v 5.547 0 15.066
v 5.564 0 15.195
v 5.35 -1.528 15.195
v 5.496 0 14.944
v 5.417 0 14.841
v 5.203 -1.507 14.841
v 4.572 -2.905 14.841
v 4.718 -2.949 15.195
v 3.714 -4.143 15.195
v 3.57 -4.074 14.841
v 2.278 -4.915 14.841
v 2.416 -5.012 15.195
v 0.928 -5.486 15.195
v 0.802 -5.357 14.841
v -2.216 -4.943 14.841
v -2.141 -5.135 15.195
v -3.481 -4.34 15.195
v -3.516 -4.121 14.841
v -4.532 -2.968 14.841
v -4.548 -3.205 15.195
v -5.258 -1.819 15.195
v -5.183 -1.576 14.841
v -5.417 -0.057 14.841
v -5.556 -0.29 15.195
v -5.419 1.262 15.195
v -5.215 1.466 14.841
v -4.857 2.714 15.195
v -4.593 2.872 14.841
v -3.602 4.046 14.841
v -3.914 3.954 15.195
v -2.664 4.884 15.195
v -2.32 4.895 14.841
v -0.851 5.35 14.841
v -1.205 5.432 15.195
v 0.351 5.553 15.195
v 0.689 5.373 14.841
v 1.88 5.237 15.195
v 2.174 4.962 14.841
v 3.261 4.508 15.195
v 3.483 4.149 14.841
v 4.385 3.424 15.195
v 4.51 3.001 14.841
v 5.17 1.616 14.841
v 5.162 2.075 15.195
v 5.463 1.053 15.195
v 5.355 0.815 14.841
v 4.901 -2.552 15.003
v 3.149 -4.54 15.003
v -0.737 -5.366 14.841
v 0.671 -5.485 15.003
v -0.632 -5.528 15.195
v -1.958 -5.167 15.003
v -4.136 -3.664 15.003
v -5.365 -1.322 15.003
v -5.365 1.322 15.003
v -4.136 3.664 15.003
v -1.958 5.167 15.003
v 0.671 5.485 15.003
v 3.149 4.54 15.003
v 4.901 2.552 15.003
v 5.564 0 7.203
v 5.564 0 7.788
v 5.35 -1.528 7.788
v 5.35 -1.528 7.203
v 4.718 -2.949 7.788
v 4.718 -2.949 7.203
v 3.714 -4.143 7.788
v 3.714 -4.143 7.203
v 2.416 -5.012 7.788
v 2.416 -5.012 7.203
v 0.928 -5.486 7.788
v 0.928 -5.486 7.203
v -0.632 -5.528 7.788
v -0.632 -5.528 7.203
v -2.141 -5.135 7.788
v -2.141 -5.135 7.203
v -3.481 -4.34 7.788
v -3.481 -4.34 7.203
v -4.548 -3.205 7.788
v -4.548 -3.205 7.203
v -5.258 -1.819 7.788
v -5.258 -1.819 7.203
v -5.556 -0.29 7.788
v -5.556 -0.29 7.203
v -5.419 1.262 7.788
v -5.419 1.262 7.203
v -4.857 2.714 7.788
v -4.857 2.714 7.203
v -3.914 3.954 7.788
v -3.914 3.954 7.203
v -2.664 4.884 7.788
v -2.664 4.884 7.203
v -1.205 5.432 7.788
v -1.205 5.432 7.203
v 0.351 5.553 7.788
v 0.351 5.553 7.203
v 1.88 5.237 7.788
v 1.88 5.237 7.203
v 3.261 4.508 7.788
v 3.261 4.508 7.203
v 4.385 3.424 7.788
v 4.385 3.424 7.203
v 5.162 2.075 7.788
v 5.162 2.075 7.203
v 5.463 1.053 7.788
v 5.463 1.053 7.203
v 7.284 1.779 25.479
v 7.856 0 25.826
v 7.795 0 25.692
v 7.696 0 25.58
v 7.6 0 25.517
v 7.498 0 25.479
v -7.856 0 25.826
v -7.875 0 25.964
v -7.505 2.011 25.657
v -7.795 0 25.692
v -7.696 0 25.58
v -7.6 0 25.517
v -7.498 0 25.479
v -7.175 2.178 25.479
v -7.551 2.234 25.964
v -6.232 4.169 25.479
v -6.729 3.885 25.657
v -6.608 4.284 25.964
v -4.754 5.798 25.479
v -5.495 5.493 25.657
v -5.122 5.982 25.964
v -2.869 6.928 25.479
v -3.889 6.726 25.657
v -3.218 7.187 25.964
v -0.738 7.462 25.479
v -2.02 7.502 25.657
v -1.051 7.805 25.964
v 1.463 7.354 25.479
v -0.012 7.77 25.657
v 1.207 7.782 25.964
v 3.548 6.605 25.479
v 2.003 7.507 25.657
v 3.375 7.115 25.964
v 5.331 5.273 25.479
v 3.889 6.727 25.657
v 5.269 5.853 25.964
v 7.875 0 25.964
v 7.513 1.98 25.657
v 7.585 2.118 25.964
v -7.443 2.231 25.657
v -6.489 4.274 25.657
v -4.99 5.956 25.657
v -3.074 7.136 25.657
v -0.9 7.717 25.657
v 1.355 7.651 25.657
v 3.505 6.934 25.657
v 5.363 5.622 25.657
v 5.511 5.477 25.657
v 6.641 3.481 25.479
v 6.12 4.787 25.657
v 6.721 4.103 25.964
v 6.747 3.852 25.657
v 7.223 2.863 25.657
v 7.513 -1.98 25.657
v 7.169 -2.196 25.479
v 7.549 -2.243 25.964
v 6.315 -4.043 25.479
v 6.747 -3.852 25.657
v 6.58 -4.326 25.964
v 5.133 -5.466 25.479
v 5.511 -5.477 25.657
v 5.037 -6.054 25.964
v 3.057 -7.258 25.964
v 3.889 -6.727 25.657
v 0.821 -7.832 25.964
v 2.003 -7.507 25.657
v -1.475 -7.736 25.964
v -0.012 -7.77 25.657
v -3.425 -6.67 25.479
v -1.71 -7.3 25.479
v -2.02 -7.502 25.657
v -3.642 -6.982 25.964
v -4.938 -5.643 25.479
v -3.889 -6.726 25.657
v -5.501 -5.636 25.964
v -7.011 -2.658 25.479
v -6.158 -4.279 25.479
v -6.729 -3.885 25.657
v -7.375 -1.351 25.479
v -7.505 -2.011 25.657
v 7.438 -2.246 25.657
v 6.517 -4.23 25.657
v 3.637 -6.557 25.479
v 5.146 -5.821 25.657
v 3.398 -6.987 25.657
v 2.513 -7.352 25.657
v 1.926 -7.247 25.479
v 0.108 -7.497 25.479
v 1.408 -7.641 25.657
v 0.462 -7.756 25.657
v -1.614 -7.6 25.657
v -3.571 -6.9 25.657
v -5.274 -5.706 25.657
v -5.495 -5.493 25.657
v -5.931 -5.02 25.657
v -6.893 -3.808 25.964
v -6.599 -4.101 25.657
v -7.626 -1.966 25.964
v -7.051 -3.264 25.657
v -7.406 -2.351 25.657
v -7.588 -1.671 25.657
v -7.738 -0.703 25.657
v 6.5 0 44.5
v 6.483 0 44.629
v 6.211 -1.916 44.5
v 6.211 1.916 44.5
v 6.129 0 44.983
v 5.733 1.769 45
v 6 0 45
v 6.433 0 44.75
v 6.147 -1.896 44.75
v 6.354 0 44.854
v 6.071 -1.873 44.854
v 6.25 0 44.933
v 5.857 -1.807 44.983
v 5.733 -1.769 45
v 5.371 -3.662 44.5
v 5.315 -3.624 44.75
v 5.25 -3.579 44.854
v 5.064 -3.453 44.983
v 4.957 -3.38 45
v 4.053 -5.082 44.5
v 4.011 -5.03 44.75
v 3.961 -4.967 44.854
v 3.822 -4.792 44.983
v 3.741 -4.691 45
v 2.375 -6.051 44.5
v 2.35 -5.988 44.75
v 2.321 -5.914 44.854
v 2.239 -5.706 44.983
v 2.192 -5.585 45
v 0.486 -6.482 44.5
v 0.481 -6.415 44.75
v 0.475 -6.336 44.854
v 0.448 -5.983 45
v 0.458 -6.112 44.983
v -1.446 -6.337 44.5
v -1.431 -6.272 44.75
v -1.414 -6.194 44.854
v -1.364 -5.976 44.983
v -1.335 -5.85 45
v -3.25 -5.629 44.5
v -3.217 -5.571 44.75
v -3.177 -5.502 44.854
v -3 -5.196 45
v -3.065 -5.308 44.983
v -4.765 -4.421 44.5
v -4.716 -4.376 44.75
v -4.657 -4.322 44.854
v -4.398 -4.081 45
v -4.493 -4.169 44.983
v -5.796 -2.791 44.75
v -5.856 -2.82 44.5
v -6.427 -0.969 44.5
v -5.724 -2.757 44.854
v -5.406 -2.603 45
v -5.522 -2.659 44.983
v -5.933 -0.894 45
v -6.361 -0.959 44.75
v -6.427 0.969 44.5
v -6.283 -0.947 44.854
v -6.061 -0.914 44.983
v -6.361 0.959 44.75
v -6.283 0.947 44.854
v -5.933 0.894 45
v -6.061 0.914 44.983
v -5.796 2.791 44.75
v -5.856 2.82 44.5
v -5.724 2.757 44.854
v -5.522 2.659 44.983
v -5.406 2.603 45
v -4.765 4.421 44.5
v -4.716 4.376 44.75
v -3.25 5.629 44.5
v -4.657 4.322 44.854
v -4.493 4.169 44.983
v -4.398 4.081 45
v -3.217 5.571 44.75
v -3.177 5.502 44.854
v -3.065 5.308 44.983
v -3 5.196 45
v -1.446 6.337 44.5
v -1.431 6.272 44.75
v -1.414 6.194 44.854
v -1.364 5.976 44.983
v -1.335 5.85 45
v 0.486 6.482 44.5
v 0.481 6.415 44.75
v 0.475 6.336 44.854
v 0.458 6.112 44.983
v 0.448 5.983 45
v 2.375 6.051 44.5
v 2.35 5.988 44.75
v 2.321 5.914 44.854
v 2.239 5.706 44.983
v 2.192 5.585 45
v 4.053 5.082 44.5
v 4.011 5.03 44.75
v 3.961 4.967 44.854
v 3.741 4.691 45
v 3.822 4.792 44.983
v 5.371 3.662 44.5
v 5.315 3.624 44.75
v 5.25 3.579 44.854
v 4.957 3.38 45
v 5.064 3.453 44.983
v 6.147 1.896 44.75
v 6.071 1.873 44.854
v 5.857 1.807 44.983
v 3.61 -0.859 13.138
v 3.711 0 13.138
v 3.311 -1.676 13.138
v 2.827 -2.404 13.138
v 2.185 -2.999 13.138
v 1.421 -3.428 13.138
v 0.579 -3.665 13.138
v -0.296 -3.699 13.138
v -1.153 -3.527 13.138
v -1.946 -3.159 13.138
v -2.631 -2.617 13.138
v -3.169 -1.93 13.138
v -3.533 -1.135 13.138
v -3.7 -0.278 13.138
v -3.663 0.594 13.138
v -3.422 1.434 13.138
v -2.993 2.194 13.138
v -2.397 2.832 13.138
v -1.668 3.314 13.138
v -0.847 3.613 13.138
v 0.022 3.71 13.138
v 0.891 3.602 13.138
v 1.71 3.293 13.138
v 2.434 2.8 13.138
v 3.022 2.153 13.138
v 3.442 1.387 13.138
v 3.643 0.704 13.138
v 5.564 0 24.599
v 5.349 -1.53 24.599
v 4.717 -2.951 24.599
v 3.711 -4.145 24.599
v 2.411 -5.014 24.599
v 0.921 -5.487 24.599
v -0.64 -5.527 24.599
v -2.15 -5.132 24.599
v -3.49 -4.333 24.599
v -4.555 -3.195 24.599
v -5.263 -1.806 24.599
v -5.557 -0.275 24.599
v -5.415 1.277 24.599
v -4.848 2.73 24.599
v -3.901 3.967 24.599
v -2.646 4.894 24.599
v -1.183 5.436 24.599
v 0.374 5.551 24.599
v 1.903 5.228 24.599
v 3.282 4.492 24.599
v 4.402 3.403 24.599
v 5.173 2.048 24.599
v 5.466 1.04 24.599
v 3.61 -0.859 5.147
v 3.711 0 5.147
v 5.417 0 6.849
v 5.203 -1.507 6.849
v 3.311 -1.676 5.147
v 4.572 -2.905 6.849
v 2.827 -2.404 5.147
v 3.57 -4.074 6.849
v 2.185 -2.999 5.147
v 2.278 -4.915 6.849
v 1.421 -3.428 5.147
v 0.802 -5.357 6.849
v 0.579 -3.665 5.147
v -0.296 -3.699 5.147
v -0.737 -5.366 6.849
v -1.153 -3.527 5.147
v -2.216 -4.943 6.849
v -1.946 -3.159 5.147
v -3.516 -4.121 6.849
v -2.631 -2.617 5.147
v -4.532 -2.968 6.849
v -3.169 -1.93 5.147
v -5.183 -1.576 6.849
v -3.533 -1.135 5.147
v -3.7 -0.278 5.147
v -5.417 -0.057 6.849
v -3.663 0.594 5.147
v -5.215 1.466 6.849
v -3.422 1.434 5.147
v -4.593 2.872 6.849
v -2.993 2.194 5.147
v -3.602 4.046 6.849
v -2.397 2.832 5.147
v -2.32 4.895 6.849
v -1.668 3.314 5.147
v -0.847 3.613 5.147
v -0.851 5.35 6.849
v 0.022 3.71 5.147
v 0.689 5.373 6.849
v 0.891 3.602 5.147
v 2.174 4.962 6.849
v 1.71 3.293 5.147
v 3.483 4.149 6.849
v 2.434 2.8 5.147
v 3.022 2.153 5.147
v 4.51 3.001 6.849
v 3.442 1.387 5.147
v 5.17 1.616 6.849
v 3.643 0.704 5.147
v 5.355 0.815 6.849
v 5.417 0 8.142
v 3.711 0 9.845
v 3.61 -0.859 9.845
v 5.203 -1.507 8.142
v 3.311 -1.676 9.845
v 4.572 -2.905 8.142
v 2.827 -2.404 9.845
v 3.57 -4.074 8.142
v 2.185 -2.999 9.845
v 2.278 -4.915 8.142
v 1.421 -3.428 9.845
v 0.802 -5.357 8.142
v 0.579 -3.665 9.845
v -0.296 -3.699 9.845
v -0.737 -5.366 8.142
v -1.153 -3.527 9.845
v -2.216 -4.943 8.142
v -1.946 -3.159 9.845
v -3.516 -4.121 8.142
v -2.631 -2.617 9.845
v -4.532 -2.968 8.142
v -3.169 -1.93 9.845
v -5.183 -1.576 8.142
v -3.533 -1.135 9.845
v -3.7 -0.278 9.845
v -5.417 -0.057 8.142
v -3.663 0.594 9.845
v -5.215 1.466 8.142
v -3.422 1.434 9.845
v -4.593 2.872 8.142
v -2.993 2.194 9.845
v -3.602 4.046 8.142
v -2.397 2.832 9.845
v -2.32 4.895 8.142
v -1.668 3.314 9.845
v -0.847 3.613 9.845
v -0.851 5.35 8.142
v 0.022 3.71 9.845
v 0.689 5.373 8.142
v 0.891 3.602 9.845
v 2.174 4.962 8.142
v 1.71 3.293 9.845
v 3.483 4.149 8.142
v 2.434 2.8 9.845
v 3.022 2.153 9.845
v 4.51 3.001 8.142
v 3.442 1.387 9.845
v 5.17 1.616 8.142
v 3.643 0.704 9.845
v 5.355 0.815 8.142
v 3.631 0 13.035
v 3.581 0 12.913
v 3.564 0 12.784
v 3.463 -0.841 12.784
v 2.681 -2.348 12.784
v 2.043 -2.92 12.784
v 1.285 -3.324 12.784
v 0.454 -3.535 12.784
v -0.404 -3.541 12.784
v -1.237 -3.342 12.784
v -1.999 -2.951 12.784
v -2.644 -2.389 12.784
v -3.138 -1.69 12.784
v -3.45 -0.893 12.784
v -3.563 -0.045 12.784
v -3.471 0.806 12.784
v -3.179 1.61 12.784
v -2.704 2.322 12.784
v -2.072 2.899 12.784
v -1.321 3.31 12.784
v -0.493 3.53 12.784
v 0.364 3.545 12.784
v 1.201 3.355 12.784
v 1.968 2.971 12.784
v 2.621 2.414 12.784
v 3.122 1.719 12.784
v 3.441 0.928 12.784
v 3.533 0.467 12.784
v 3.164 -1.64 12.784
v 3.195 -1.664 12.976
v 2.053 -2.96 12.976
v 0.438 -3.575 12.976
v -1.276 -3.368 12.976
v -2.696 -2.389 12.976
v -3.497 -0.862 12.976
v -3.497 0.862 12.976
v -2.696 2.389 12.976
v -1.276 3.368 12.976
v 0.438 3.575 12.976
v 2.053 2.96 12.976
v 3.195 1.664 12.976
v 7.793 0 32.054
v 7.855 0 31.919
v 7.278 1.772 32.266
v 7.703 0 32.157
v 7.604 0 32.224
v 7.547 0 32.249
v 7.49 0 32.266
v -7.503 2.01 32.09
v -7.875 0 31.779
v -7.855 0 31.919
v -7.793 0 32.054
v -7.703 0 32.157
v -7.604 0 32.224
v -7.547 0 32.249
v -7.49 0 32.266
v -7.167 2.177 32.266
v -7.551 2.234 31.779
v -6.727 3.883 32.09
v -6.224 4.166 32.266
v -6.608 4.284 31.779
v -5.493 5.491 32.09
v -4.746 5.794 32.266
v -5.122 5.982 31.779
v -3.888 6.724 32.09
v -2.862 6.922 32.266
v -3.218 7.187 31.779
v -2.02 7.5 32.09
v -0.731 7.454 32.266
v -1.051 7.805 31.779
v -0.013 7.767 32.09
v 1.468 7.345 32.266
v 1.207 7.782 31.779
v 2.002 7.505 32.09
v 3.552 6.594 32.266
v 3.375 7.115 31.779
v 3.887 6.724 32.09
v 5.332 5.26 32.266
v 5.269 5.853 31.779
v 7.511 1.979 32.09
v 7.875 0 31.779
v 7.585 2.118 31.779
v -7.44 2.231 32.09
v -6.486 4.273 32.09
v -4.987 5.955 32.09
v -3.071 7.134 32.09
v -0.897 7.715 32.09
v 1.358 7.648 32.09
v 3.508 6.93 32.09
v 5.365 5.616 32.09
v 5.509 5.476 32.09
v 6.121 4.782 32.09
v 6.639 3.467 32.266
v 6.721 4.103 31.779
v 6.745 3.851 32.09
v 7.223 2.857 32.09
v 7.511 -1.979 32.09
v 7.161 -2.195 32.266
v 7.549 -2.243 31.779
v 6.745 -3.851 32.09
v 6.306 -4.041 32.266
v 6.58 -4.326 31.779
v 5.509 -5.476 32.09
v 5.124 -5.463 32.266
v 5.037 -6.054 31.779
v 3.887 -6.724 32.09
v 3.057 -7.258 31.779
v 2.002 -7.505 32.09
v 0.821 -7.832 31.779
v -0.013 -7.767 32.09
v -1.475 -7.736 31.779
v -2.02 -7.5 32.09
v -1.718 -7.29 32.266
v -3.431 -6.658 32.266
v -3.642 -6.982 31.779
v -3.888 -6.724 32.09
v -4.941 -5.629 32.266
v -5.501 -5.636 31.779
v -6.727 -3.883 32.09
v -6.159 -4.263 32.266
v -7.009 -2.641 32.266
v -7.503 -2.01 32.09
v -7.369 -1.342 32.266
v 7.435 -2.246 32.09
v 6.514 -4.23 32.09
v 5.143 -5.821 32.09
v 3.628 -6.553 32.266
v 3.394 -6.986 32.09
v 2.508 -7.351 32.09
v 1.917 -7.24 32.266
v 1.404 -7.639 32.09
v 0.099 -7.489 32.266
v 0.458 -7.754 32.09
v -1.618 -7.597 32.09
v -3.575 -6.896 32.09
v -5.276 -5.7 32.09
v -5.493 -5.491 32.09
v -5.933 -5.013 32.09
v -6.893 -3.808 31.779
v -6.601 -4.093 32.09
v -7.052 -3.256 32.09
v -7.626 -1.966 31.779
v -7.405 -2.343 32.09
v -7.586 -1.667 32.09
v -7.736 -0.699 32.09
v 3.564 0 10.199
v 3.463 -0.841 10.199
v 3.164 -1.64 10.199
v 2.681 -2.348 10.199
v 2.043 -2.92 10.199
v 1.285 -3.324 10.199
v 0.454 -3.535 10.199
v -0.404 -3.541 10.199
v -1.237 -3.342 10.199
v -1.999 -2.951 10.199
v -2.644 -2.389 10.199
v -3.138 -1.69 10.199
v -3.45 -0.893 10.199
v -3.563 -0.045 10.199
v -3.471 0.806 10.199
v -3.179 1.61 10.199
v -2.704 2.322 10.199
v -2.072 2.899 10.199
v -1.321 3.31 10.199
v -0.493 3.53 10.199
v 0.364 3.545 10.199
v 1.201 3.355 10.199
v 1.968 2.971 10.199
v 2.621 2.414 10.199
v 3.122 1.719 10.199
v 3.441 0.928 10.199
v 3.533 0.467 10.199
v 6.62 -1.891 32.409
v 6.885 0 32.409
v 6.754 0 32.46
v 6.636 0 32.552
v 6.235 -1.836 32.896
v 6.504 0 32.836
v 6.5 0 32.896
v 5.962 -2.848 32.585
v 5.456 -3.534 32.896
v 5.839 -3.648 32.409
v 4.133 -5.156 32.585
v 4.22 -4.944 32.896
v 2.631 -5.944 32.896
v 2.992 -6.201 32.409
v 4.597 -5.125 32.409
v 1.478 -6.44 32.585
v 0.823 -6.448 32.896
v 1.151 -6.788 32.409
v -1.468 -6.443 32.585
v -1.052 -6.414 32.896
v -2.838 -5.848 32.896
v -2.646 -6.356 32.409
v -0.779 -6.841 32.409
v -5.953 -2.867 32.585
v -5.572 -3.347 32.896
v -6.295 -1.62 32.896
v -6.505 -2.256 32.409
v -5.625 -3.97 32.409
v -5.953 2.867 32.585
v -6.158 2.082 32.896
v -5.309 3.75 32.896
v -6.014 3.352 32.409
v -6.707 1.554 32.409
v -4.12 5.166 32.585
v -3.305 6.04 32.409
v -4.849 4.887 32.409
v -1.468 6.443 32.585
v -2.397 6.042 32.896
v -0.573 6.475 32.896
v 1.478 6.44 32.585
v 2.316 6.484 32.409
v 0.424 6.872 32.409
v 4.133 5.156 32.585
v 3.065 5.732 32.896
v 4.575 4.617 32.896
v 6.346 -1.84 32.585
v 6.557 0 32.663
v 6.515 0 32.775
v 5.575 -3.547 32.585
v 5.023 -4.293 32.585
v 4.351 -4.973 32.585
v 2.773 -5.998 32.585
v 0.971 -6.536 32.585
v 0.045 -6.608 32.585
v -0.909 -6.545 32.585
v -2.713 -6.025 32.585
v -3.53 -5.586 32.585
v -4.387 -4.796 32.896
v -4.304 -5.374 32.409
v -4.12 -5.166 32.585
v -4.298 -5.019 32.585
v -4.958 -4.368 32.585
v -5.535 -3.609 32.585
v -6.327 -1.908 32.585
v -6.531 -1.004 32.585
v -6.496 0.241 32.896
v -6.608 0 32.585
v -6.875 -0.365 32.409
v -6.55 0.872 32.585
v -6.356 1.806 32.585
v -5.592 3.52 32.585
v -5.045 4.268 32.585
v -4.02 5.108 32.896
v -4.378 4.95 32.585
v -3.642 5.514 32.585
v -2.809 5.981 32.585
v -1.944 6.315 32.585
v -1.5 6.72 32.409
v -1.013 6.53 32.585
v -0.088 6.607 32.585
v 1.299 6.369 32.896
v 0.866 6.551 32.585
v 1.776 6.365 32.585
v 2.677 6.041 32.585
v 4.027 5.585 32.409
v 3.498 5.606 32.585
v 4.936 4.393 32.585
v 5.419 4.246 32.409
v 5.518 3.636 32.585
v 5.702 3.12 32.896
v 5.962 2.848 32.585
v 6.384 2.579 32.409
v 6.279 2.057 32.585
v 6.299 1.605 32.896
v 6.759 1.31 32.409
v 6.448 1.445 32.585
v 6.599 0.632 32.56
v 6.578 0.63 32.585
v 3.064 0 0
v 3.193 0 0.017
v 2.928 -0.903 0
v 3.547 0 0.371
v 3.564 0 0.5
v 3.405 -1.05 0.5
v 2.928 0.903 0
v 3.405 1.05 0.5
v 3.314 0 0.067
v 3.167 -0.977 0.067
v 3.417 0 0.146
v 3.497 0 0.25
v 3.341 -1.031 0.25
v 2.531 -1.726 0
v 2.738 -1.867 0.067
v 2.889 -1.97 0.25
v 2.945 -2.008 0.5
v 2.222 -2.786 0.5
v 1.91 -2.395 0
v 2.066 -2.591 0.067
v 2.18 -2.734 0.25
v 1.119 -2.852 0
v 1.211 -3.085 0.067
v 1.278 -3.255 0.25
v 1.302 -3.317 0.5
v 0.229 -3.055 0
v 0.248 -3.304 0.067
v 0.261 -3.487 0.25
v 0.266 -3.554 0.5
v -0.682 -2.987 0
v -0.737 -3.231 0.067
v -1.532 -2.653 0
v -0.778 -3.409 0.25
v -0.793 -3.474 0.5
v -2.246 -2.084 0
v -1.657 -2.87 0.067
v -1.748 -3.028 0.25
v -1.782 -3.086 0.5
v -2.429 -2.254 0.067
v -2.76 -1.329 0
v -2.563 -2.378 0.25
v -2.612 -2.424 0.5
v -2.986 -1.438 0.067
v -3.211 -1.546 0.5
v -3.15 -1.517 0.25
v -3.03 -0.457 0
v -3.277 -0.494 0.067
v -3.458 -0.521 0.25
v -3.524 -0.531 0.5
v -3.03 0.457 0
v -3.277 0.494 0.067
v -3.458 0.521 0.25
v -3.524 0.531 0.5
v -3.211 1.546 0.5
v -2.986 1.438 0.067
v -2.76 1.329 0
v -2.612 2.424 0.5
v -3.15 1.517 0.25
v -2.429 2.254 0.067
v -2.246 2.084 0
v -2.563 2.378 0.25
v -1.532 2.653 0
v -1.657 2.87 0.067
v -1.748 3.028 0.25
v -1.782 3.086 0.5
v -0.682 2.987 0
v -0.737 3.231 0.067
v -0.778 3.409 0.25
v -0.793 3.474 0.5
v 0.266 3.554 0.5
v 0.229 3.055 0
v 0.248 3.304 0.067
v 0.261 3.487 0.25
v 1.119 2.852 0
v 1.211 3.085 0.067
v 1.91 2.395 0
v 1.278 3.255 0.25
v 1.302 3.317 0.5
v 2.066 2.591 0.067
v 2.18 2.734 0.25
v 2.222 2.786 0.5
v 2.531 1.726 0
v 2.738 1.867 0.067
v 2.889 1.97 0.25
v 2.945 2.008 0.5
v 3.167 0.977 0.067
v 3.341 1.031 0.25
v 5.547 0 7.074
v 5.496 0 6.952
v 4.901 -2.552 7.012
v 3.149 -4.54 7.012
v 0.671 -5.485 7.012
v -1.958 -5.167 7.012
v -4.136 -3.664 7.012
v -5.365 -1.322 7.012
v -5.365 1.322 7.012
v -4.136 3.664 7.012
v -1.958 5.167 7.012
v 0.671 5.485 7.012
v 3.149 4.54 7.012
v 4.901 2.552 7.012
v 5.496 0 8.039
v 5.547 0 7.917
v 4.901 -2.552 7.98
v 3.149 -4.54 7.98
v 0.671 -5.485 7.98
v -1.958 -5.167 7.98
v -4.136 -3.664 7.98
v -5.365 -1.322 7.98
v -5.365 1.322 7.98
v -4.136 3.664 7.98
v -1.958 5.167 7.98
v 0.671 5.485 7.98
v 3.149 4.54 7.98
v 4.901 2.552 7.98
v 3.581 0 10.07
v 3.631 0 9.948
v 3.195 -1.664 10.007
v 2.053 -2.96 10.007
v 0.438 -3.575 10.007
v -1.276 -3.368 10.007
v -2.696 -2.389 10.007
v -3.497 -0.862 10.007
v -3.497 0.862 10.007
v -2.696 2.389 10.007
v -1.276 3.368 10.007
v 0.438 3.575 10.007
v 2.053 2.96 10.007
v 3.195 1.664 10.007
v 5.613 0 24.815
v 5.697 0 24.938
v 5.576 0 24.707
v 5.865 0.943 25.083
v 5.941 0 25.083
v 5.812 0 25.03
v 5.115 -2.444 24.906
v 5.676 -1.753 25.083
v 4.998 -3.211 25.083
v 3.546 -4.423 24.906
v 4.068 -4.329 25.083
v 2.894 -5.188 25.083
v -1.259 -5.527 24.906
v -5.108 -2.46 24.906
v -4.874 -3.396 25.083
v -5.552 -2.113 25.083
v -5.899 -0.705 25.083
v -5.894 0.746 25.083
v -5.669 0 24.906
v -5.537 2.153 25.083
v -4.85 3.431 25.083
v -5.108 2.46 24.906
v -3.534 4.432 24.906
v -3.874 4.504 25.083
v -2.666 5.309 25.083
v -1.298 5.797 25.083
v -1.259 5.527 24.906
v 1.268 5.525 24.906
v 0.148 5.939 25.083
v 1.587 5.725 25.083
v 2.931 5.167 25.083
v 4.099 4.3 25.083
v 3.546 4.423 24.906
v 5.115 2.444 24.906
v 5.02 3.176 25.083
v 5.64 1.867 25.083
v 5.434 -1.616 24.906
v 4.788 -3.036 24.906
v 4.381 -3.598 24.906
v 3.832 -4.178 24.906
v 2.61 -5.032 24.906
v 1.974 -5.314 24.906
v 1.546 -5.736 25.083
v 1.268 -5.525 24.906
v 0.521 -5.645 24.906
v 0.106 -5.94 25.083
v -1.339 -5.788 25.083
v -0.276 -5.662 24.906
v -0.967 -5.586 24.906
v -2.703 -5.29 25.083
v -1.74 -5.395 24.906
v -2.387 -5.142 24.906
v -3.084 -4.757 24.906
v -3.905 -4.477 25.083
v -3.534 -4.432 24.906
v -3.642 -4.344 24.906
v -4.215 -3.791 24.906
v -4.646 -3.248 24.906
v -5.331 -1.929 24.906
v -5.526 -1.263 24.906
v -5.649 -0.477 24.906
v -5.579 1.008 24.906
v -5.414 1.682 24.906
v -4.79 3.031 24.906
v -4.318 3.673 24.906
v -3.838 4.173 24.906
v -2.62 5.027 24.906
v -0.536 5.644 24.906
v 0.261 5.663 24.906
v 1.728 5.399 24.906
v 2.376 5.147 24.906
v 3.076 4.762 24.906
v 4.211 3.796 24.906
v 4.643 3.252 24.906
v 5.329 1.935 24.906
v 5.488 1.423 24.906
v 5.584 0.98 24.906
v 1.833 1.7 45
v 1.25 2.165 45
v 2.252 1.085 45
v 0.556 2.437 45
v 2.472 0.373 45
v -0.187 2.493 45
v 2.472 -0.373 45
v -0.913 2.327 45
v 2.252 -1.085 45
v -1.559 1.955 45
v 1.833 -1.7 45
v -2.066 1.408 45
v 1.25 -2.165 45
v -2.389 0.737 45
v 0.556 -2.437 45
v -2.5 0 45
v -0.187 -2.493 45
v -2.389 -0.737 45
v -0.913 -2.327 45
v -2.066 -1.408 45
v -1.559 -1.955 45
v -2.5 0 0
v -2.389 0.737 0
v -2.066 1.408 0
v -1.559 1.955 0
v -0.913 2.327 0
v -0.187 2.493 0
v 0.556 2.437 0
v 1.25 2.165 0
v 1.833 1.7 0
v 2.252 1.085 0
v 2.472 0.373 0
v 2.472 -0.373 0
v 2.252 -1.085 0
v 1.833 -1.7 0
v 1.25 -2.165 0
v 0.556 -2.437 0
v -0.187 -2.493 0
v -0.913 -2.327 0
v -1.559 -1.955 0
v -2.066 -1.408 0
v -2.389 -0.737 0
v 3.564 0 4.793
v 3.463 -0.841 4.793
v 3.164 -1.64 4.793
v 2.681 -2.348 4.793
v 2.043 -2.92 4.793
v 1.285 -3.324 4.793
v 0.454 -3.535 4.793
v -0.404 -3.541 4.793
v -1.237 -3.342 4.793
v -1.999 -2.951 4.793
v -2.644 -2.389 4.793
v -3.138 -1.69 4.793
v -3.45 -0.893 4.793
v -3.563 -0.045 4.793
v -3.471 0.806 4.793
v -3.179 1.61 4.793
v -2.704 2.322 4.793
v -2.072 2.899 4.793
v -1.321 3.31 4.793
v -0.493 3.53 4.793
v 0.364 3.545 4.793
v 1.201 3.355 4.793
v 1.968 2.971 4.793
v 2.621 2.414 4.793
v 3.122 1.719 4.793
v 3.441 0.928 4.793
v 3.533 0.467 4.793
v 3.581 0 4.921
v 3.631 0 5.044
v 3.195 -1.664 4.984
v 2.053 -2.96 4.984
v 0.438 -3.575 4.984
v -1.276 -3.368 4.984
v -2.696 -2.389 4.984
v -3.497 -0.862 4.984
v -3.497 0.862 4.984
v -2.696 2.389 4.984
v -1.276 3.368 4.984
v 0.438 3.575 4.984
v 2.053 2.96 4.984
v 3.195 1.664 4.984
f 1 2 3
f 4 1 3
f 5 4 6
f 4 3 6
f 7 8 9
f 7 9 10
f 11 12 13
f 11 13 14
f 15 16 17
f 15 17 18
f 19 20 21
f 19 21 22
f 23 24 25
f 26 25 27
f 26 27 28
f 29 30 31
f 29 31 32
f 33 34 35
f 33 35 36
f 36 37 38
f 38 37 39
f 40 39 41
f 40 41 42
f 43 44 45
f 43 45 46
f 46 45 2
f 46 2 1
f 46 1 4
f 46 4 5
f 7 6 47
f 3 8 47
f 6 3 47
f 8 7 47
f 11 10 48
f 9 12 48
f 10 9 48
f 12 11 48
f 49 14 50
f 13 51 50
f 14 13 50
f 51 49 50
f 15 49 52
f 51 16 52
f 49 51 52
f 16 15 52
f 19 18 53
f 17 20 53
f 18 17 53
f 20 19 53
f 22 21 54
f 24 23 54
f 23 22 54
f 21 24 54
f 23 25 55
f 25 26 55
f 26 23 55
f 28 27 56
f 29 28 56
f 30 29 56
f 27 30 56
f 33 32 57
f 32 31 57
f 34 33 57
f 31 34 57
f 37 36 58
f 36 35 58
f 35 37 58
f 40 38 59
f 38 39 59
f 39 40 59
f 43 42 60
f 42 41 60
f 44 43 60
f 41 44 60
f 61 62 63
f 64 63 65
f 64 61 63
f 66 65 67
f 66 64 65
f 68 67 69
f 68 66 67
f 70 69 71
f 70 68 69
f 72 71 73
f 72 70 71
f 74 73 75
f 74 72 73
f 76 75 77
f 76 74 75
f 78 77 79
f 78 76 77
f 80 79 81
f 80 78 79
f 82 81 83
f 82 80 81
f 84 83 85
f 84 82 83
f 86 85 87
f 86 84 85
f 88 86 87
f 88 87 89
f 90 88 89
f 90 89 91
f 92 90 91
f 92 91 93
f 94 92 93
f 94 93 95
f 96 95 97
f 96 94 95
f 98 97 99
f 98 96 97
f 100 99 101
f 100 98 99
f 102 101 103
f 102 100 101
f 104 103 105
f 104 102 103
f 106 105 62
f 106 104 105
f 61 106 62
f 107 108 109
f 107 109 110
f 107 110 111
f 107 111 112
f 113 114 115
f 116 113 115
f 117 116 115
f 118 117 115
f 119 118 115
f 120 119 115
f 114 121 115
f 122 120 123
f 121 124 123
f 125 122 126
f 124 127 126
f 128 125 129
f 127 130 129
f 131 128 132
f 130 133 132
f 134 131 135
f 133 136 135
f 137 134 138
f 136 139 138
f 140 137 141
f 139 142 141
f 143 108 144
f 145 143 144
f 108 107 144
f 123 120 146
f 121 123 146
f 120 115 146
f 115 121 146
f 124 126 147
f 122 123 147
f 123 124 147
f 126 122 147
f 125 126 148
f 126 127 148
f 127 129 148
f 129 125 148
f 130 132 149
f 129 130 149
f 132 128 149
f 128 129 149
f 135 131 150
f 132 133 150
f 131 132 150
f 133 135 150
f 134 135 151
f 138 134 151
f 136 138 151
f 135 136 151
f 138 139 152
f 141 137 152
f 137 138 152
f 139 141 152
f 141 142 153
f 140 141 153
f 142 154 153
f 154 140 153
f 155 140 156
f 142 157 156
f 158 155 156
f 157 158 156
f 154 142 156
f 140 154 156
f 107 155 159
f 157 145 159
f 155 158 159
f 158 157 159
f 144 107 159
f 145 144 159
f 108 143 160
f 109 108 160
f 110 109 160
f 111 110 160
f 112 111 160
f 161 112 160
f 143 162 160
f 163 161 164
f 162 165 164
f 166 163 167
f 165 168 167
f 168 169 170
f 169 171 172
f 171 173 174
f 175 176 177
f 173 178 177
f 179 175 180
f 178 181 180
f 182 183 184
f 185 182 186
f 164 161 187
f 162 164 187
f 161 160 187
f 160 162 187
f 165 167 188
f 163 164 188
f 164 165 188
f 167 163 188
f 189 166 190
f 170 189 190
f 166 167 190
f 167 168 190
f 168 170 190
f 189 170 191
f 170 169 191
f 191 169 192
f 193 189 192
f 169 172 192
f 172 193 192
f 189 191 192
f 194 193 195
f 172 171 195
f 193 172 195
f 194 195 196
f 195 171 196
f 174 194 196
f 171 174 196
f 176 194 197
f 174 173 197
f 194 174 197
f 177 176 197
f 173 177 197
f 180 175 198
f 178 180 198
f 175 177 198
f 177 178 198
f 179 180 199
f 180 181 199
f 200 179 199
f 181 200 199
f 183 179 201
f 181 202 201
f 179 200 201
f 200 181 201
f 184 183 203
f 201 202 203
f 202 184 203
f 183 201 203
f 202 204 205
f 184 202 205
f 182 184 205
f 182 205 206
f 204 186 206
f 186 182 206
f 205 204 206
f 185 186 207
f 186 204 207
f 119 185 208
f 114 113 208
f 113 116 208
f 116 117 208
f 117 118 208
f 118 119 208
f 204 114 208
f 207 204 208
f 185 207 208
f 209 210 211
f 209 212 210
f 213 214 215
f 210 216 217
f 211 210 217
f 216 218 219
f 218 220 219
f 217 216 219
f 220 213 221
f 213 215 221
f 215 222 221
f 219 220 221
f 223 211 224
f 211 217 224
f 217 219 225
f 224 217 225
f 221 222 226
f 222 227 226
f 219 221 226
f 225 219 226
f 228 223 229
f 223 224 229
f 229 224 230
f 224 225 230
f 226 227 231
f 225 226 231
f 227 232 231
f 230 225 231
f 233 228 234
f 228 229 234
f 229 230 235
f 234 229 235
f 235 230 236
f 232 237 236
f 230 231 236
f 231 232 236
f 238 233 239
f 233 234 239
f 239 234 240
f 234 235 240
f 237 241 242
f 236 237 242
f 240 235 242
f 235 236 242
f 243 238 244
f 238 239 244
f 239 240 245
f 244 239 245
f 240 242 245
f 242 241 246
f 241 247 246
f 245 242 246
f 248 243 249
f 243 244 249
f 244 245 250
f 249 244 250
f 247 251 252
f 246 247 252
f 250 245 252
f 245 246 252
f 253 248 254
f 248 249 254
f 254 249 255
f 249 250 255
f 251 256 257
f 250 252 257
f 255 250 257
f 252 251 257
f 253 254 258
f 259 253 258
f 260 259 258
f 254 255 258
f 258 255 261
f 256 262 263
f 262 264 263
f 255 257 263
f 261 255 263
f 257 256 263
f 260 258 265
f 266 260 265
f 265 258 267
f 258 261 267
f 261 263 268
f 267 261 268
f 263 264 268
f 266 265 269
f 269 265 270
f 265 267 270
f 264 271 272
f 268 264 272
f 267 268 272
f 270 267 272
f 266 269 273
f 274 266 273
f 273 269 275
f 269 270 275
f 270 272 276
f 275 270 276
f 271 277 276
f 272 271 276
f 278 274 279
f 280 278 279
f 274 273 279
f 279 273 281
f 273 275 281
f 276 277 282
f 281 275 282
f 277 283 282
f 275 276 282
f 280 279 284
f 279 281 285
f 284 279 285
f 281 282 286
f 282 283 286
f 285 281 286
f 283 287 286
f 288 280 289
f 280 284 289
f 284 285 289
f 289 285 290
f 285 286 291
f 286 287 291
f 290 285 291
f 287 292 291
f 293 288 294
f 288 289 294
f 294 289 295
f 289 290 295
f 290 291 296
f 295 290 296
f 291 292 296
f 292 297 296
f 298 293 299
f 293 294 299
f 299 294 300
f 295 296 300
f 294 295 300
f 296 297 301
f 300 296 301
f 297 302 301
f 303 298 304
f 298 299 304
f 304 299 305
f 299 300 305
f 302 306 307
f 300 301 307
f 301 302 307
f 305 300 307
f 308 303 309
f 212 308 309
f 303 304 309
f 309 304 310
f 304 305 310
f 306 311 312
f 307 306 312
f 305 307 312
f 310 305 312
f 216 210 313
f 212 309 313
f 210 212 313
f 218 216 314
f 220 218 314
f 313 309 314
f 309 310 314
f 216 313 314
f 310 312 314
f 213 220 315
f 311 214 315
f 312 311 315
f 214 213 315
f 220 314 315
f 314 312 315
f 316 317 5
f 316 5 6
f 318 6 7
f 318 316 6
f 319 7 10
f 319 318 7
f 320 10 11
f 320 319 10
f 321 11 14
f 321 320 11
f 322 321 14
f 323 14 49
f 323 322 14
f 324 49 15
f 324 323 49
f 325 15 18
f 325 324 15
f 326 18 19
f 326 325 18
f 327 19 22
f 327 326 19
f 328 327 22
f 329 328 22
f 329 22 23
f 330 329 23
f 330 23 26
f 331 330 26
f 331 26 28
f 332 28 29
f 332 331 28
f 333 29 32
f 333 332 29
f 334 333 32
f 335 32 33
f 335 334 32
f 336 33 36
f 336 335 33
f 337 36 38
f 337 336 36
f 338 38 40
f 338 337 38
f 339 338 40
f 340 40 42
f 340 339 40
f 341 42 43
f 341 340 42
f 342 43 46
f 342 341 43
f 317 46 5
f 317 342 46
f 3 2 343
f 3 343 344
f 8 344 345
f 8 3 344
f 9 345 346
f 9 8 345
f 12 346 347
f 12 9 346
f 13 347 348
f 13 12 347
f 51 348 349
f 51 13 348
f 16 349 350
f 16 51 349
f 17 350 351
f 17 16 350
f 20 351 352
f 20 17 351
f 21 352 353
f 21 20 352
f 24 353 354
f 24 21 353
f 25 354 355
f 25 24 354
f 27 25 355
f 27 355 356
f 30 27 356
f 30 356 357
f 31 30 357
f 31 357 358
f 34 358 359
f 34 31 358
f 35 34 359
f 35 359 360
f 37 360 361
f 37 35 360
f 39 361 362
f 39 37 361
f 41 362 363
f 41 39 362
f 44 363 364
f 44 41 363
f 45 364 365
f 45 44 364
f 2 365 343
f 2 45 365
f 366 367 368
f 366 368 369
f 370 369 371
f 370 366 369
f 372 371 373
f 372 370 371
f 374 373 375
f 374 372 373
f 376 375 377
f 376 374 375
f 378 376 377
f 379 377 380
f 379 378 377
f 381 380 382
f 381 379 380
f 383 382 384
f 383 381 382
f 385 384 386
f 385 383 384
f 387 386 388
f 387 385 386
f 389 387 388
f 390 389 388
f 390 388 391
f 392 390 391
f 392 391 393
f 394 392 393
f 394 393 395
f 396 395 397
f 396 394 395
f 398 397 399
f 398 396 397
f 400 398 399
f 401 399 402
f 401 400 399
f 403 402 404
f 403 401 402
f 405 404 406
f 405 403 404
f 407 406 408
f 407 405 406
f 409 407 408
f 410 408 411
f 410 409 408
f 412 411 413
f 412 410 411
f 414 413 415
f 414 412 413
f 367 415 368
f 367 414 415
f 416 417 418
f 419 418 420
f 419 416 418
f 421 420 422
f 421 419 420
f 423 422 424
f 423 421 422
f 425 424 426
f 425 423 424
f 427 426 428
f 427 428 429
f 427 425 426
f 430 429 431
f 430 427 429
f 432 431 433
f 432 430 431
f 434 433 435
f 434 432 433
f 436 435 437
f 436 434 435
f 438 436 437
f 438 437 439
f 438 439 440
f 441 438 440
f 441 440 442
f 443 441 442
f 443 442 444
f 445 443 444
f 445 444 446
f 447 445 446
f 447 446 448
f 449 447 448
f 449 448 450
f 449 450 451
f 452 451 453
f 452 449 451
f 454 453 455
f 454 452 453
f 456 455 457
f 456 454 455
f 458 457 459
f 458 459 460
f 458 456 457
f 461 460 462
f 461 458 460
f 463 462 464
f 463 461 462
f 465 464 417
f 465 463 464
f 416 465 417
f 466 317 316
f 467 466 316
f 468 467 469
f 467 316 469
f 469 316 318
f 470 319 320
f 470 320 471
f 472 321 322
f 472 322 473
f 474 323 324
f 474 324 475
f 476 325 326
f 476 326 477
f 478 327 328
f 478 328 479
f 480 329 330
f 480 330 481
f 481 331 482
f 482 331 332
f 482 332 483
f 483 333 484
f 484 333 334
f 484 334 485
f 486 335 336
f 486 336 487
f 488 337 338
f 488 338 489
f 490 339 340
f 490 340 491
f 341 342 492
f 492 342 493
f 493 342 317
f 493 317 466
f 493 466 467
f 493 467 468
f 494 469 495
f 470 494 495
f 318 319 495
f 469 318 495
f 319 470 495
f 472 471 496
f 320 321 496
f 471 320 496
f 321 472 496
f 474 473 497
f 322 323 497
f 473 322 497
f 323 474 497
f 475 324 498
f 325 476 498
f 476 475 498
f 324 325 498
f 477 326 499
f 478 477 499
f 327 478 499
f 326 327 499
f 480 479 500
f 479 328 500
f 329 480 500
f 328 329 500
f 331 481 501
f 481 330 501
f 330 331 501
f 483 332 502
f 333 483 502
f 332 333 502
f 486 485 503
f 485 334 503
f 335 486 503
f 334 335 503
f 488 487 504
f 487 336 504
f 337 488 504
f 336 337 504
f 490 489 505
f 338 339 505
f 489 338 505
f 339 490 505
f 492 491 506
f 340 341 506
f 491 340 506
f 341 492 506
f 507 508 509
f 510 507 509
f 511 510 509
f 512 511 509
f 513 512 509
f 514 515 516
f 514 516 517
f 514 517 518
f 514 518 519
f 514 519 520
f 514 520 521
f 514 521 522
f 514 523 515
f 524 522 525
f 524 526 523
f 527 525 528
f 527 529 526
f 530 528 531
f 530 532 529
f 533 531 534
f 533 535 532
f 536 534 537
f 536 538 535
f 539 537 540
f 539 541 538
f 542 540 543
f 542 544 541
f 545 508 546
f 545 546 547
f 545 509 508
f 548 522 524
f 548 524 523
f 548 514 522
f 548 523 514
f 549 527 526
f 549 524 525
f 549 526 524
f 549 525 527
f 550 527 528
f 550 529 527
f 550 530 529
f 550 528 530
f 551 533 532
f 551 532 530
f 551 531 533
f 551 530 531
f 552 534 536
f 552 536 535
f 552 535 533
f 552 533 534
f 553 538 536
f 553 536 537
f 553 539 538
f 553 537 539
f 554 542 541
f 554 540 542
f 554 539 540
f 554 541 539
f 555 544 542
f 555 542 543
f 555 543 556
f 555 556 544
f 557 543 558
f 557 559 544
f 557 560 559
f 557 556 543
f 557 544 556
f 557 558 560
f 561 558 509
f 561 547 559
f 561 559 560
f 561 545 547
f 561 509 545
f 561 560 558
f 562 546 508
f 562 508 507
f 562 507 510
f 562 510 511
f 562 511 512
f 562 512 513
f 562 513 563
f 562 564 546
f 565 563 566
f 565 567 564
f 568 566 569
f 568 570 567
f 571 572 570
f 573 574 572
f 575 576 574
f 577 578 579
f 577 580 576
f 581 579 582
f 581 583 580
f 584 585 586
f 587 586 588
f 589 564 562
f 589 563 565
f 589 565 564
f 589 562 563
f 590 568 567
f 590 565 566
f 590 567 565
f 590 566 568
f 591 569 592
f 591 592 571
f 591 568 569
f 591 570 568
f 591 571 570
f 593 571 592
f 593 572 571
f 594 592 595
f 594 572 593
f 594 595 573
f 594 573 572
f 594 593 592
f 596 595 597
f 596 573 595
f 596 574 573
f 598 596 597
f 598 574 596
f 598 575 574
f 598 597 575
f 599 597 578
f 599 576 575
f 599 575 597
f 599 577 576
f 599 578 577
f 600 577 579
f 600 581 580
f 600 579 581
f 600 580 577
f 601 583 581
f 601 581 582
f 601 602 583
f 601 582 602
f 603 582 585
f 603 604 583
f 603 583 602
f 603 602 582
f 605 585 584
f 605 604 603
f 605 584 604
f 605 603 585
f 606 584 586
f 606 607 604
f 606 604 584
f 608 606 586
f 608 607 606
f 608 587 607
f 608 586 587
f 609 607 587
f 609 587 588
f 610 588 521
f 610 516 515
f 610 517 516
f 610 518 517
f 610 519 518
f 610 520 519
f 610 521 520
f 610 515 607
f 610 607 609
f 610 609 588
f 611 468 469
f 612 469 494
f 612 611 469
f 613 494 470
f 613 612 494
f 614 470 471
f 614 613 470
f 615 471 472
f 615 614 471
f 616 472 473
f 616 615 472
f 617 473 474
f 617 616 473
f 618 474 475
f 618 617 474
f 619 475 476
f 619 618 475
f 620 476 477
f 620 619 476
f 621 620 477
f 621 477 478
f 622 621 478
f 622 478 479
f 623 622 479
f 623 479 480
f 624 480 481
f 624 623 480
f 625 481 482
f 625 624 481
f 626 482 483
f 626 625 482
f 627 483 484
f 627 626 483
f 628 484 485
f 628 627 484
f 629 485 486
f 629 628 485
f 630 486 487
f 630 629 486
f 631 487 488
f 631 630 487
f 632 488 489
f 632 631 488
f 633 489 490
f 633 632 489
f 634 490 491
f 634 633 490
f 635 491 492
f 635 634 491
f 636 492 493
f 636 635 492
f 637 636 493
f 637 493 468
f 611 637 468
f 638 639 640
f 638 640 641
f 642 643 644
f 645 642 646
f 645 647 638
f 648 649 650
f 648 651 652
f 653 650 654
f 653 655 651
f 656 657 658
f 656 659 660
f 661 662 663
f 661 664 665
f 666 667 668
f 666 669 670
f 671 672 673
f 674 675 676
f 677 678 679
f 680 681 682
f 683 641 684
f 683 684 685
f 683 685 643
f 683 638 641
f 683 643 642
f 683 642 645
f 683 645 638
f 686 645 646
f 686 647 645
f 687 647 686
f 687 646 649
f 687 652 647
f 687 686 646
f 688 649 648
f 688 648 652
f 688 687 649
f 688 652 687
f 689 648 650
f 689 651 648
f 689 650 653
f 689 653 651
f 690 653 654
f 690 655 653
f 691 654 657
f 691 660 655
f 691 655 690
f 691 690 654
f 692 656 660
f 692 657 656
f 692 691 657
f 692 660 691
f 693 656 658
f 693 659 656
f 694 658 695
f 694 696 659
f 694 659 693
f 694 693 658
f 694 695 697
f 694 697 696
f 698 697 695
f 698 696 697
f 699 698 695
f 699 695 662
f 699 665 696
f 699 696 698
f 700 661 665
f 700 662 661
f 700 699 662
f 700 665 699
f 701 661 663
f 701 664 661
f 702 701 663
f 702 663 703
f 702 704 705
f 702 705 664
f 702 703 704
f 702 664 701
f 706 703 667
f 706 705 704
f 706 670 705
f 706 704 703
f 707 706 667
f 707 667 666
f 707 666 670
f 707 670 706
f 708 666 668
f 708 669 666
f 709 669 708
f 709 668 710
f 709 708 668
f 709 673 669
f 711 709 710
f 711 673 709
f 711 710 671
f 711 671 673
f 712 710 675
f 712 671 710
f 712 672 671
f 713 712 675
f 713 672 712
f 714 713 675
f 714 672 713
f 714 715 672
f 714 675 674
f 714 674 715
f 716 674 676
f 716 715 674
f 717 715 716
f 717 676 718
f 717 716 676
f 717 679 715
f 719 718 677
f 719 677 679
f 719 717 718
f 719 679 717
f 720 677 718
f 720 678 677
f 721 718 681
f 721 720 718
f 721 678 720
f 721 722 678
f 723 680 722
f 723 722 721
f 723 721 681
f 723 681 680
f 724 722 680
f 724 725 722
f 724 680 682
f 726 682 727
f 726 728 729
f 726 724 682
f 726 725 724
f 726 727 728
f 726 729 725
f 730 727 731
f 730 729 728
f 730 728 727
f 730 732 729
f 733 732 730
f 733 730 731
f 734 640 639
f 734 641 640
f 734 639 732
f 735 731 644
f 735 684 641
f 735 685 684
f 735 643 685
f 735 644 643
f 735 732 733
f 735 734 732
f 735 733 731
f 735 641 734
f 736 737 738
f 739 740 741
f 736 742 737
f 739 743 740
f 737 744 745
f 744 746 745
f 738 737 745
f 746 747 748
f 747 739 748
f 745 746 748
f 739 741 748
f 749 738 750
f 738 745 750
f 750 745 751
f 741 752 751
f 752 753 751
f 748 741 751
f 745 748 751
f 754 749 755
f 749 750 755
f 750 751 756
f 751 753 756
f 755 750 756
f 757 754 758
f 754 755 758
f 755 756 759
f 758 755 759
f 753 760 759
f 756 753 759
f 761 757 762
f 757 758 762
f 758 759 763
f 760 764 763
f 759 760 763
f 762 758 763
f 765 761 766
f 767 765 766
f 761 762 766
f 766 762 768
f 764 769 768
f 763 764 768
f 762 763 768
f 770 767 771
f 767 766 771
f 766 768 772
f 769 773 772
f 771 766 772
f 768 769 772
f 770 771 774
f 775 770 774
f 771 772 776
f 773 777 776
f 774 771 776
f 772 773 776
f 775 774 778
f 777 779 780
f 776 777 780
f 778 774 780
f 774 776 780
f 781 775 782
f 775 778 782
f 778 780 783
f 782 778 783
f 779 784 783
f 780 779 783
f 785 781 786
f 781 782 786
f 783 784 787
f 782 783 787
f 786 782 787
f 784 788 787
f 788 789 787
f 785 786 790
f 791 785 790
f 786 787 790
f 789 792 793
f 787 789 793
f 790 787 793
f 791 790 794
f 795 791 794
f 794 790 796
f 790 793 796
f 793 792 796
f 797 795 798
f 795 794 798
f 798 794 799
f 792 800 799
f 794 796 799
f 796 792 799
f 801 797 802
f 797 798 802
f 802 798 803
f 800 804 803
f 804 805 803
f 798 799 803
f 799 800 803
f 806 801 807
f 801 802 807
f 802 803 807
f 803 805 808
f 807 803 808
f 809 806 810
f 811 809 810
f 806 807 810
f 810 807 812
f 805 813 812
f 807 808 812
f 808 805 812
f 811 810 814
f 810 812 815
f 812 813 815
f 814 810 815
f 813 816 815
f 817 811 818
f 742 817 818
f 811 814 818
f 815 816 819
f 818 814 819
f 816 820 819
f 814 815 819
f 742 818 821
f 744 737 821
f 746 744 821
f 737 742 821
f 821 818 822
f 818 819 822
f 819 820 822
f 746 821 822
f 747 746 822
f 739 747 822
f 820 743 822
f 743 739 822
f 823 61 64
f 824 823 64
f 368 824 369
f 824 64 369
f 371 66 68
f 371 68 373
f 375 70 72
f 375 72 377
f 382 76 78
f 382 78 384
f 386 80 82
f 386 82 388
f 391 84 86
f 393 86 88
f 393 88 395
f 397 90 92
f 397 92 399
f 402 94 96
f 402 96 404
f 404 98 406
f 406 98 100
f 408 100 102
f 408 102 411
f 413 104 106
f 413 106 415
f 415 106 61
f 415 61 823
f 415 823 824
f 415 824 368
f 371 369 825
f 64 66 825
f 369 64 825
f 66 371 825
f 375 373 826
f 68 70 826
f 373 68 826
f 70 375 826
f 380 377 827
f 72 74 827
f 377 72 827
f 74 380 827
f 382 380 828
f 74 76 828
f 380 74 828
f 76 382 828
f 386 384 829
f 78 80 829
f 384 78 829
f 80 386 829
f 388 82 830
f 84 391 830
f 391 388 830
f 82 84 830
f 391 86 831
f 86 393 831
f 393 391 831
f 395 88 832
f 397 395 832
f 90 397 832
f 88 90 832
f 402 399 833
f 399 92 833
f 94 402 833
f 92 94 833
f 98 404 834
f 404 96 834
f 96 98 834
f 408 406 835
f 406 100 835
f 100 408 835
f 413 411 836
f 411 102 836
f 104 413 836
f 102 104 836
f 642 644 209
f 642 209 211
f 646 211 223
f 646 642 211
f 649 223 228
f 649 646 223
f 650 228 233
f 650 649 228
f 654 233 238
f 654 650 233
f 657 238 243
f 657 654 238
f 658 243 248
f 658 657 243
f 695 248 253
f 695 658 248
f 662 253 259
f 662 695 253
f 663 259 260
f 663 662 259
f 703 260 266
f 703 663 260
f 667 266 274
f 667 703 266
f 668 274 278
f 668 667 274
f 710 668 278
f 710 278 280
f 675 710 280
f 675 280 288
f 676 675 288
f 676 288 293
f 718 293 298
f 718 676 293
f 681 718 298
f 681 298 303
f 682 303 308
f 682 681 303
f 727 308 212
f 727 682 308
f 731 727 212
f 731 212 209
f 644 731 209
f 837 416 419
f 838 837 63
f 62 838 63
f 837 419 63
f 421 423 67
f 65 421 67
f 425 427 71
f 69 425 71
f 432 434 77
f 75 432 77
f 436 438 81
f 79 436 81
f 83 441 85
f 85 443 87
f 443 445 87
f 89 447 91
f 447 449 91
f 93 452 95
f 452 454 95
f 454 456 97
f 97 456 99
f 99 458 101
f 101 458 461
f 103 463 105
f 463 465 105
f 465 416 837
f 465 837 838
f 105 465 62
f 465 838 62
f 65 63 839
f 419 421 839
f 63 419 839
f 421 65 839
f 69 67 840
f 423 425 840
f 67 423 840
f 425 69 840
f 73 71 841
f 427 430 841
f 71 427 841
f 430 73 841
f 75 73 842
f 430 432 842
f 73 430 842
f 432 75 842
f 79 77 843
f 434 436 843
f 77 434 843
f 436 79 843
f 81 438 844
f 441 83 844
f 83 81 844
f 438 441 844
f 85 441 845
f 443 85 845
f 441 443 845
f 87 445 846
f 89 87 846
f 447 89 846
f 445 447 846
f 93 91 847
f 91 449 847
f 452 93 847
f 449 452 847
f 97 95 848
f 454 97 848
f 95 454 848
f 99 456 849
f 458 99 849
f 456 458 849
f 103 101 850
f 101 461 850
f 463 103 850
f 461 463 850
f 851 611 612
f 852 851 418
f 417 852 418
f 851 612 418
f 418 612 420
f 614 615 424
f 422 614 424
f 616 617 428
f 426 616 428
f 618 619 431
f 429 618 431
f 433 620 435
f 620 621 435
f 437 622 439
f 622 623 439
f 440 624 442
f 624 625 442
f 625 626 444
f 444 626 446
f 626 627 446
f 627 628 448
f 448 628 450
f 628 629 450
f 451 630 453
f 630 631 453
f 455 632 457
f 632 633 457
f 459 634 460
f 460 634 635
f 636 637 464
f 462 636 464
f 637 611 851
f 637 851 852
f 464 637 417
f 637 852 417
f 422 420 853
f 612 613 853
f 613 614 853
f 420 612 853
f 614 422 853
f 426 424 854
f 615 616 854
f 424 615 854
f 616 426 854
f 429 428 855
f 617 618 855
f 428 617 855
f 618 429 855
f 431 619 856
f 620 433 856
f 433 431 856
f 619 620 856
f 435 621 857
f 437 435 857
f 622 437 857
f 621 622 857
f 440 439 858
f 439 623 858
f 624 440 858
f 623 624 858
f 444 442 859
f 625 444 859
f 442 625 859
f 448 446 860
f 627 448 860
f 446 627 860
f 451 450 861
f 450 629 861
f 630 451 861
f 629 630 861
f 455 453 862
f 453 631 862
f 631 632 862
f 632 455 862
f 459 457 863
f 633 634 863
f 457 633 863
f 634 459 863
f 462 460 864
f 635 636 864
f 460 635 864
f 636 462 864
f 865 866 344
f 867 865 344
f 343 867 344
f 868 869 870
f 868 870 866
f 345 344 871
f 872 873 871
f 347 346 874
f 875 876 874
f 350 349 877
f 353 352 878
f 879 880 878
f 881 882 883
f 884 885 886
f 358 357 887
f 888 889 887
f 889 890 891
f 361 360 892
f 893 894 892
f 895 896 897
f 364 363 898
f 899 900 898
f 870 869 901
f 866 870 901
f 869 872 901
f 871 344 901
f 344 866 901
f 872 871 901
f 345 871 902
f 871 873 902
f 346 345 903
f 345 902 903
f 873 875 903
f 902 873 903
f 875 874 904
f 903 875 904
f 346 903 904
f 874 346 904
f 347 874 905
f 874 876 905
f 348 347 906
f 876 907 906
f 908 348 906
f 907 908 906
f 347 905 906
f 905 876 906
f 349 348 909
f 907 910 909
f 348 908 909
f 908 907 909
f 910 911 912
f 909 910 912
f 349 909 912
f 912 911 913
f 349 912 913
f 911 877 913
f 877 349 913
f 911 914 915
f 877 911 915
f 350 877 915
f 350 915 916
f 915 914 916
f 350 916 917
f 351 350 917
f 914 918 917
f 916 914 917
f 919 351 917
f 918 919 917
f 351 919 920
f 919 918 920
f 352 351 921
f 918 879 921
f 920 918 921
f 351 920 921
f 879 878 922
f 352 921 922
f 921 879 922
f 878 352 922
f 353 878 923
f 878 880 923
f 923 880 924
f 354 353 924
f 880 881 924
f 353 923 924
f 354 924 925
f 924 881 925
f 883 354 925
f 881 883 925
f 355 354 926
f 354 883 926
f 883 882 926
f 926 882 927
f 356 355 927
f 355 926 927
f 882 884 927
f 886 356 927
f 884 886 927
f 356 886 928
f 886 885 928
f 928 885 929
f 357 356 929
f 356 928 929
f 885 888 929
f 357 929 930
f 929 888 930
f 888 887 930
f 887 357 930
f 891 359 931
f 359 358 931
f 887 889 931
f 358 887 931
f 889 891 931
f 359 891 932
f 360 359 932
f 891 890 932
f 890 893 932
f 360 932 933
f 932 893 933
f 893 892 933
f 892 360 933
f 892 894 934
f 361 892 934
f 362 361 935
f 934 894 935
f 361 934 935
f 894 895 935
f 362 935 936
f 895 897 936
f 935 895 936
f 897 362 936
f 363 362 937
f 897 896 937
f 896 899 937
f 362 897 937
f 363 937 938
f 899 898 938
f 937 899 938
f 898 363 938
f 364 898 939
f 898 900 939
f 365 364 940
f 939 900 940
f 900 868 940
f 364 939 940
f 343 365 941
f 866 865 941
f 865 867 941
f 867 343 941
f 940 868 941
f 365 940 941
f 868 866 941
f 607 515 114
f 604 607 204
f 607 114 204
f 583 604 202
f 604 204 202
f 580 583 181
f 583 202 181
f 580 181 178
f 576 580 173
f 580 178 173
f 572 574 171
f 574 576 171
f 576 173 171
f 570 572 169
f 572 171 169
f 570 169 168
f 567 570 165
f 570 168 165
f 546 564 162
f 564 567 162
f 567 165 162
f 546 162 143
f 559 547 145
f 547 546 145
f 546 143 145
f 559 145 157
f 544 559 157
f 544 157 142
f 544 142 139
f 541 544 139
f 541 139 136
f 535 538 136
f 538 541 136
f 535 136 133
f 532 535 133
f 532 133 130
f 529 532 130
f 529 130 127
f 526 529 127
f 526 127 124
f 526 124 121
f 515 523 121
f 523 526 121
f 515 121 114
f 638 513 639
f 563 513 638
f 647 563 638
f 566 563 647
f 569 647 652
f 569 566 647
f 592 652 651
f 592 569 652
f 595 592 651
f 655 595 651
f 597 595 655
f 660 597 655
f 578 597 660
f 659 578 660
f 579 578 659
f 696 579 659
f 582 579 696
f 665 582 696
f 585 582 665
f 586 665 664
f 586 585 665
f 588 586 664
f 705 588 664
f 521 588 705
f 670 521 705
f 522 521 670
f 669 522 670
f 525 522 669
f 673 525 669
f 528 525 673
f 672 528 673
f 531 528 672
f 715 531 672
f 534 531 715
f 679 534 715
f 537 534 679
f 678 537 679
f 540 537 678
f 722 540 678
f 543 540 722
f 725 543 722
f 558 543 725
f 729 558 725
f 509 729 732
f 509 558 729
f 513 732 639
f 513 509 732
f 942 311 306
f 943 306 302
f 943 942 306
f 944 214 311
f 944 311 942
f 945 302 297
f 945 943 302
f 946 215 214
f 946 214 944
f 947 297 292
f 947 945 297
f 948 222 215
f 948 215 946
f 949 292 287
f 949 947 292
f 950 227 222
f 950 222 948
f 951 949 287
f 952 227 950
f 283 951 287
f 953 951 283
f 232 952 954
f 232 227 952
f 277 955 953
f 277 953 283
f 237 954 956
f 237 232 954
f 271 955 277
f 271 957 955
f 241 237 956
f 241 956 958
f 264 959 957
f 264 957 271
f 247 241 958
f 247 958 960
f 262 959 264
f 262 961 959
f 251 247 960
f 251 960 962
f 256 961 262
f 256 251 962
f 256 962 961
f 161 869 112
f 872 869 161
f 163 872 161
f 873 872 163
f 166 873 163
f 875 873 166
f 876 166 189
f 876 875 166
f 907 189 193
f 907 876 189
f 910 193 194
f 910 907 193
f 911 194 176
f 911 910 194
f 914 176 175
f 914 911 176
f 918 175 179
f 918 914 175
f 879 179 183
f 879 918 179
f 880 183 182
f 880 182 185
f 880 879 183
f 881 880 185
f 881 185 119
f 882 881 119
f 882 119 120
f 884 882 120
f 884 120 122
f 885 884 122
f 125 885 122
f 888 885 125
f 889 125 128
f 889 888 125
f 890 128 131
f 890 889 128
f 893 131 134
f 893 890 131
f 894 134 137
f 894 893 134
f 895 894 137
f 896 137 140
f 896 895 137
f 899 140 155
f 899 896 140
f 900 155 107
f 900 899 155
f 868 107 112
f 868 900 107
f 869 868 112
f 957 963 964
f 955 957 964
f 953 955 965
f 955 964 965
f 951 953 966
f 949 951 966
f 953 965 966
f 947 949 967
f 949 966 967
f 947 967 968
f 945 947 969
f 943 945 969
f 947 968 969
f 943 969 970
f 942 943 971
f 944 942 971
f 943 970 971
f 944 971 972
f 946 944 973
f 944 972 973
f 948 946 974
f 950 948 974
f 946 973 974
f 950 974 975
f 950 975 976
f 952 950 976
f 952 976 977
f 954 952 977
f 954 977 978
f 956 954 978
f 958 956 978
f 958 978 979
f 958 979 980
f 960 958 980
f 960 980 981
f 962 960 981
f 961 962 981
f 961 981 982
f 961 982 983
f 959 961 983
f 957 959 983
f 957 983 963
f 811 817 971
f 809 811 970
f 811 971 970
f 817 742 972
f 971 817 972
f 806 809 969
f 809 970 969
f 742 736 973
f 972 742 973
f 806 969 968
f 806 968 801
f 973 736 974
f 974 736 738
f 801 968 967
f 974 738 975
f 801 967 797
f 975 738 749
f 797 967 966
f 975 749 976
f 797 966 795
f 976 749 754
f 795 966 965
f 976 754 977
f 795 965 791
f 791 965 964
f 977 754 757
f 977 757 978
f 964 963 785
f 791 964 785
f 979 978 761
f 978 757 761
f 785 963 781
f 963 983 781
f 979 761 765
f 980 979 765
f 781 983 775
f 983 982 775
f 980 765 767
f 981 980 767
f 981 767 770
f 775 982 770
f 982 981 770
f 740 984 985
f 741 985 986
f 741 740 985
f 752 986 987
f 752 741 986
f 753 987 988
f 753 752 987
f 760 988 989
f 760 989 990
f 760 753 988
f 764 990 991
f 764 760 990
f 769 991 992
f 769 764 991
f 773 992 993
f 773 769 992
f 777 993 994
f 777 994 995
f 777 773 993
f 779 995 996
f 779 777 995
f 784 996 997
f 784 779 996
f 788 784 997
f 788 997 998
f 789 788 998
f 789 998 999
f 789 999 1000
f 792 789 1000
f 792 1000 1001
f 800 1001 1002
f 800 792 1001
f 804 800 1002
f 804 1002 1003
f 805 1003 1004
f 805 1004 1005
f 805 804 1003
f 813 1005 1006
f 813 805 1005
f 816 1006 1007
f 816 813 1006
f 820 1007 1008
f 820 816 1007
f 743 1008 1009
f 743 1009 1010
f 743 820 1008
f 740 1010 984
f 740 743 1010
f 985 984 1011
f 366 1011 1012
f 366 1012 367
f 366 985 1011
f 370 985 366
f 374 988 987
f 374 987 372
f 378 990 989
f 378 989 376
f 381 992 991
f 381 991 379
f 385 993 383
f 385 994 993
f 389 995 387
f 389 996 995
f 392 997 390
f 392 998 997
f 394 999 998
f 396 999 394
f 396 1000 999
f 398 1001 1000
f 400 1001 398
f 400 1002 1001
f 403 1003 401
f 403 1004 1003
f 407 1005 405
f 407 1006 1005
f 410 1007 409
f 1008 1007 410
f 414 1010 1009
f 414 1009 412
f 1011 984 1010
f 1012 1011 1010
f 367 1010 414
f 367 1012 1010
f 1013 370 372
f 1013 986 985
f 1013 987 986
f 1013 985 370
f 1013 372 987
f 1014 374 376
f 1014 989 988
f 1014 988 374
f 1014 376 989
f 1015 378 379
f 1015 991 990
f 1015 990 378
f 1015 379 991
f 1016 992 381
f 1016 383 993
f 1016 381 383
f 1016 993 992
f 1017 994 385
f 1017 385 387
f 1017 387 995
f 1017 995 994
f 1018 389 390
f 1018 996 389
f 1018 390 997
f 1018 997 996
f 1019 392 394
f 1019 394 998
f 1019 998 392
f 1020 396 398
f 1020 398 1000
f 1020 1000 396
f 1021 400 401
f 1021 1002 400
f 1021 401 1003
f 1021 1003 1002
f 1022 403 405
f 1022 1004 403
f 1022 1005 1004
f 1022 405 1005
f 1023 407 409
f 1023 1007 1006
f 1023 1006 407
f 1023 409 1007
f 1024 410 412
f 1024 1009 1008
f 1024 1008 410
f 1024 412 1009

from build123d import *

# Parameters (mm, degrees)
SKETCH1_R           = 7.875
BOSS_EXTRUDE1_DEPTH = 45
SKETCH3_R           = 2.5
CUT_EXTRUDE1_DEPTH  = 47.357645001
FILLET1_R           = 0.5


with BuildPart() as part:
    # Sketch1 → Boss-Extrude1 (new body)
    with BuildSketch(Plane.XY):
        with Locations(Location((0, 0, 0), (0, 0, 180))):
            Circle(SKETCH1_R)
    extrude(amount=BOSS_EXTRUDE1_DEPTH)

    # Sketch2 → Cut-Revolve1 (revolve, cut)
    with BuildSketch(Plane(origin=(0, 0, 0), x_dir=(1, 0, 0), z_dir=(0, 1, 0))):
        Polygon((5.563744461, -14.987420791), (3.563744461, -12.99161386), (3.563744461, -9.99161386), (5.563744461, -7.99580693), (5.563744461, -6.99580693), (3.563744461, -5), (3.563744461, 0), (17.246301574, 0), (17.246301574, -45), (6.5, -45), (6.5, -32.5), (7.875, -32.174923206), (7.875, -25.574923206), (5.563744461, -24.987420791), align=None)
    revolve(axis=Axis((0, 0, 45), (0, 0, -1)), mode=Mode.SUBTRACT)

    # Sketch3 → Cut-Extrude1 (cut, through all)
    with BuildSketch(Plane(origin=(0, 0, 0), x_dir=(-1, 0, 0), z_dir=(0, 0, -1))):
        Circle(SKETCH3_R)
    extrude(amount=-CUT_EXTRUDE1_DEPTH, mode=Mode.SUBTRACT)

    # Fillet1
    fillet1_edges = [part.edges().sort_by_distance(p)[0] for p in [
        (-3.563744461, 0, 5),
        (-5.563744461, 0, 6.99580693),
        (-5.563744461, 0, 7.99580693),
        (-3.563744461, 0, 0),
        (-3.563744461, 0, 9.99161386),
        (-3.563744461, 0, 12.99161386),
        (-5.563744461, 0, 14.987420791),
        (-5.563744461, 0, 24.987420791),
        (0, 7.875, 25.574923206),
        (0, 7.875, 32.174923206),
        (-6.5, 0, 32.5),
        (-6.5, 0, 45),
    ]]
    fillet(fillet1_edges, radius=FILLET1_R)


solid = part.part
